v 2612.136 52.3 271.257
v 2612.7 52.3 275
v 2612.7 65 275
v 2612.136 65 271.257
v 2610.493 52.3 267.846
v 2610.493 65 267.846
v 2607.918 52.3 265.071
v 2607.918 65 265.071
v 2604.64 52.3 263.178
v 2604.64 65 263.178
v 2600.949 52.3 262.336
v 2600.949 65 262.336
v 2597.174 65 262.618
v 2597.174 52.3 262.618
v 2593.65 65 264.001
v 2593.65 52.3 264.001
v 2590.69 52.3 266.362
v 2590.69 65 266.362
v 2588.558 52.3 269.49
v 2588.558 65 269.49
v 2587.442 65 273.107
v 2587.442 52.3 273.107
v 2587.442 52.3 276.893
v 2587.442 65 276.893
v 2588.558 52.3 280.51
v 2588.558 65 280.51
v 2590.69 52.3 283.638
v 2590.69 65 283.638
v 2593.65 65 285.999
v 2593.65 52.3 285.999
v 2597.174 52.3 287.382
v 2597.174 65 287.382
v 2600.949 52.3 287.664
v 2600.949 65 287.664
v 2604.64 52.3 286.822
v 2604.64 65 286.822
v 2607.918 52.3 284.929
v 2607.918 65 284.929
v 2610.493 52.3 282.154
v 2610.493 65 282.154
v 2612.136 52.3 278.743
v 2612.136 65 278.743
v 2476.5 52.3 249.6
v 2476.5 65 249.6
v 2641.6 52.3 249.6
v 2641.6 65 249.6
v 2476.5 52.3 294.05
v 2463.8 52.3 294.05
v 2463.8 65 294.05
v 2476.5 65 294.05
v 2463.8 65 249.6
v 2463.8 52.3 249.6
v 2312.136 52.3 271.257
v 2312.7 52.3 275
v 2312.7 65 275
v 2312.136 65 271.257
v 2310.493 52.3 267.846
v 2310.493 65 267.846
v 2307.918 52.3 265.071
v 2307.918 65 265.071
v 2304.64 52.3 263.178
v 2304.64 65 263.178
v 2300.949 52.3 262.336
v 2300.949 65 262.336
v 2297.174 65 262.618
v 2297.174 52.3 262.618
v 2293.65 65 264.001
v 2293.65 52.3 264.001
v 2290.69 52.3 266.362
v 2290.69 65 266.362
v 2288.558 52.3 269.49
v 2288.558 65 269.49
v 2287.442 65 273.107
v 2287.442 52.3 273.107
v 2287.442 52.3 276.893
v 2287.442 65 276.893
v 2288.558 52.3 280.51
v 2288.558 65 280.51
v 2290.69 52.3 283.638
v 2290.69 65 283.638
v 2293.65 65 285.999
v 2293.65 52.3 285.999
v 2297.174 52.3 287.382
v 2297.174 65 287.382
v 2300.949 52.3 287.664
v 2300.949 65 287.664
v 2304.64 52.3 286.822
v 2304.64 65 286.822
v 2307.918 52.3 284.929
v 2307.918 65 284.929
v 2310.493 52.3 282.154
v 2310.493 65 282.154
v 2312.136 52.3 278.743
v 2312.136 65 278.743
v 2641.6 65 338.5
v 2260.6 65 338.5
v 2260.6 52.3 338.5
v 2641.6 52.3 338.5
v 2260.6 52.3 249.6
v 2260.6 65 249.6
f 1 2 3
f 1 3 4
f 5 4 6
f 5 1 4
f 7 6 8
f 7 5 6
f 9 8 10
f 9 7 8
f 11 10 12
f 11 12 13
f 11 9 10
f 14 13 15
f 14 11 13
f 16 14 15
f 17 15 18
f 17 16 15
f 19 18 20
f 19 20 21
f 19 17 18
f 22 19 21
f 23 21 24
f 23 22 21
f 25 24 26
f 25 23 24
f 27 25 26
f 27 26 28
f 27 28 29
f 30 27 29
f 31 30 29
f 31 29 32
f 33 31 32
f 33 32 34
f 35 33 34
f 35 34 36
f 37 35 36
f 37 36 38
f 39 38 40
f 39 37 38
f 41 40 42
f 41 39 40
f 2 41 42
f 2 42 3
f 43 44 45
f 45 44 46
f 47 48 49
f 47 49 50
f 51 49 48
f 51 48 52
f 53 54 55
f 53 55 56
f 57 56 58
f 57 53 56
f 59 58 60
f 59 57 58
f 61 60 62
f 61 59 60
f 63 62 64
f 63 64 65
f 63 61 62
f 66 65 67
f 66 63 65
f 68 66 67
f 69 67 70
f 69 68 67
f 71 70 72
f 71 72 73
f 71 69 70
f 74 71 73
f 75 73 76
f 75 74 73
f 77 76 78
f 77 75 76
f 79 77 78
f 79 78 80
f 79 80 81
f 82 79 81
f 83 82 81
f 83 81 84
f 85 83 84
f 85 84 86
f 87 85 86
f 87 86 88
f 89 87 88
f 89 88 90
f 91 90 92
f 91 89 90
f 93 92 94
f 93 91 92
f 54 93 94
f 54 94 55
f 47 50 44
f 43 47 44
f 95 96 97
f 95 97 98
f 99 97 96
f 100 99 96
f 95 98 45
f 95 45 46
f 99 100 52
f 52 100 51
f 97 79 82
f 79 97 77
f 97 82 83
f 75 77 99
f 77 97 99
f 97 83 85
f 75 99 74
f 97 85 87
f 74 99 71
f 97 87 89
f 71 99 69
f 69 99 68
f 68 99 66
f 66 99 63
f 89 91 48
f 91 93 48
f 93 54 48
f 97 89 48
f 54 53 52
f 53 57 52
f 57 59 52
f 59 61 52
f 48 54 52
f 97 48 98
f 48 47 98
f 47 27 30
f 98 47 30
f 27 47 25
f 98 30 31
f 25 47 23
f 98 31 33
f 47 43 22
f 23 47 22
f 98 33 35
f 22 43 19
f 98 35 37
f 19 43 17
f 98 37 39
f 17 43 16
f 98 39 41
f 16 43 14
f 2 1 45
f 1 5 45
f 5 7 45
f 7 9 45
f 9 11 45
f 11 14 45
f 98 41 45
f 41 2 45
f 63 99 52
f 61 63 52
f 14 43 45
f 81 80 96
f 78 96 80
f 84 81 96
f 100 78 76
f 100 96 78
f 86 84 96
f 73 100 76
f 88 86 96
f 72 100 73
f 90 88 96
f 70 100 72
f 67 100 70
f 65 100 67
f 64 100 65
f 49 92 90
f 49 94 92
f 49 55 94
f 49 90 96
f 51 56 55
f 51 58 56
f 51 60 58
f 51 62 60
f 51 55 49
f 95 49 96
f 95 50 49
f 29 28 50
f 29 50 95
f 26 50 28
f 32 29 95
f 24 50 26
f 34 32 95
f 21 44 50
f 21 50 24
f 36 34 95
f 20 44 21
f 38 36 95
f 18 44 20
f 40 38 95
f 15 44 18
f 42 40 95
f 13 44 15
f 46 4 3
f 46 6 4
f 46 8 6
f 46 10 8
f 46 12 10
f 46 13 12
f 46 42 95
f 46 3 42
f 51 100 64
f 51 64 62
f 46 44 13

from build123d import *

# Parameters (mm, degrees)
BOSS_EXTRUDE1_DEPTH      = 50.8
BOSS_EXTRUDE1_DEPTH_BACK = 38.1
SKETCH1_W                = 381
SKETCH1_H                = 12.7
SKETCH3_W                = 12.7
SKETCH3_H                = 44.45
CUT_EXTRUDE1_DEPTH       = 2664.230012597
CAVITY1_START            = 52.3
CAVITY1_OUTLINE_R        = 12.7
CAVITY1_DEPTH            = 12.7


# Read off the part's stored shape, not the designer's step: Cavity1
with BuildPart() as part:
    # Sketch1 → Boss-Extrude1 (new, two sides: drawn at the far end of the back side and taken through both)
    with BuildSketch(Plane.XY.offset(287.7).offset(-BOSS_EXTRUDE1_DEPTH_BACK)):
        with Locations((2451.1, 58.65)):
            Rectangle(SKETCH1_W, SKETCH1_H)
    extrude(amount=BOSS_EXTRUDE1_DEPTH + BOSS_EXTRUDE1_DEPTH_BACK)

    # Sketch3 → Cut-Extrude1 (cut, through all)
    with BuildSketch(Plane(origin=(0, 65, 0), x_dir=(1, 0, 0), z_dir=(0, 1, 0))):
        with Locations((2470.15, -271.825)):
            Rectangle(SKETCH3_W, SKETCH3_H)
    extrude(amount=-CUT_EXTRUDE1_DEPTH, mode=Mode.SUBTRACT)

    # Cavity1 outline → Cavity1 (cut)
    with BuildSketch(Plane(origin=(0, 0, 0), x_dir=(1, 0, 0), z_dir=(0, 1, 0)).offset(CAVITY1_START)):
        with Locations((2300, -275)):
            Circle(CAVITY1_OUTLINE_R)
        with Locations((2600, -275)):
            Circle(CAVITY1_OUTLINE_R)
    extrude(amount=CAVITY1_DEPTH, mode=Mode.SUBTRACT)


solid = part.part
